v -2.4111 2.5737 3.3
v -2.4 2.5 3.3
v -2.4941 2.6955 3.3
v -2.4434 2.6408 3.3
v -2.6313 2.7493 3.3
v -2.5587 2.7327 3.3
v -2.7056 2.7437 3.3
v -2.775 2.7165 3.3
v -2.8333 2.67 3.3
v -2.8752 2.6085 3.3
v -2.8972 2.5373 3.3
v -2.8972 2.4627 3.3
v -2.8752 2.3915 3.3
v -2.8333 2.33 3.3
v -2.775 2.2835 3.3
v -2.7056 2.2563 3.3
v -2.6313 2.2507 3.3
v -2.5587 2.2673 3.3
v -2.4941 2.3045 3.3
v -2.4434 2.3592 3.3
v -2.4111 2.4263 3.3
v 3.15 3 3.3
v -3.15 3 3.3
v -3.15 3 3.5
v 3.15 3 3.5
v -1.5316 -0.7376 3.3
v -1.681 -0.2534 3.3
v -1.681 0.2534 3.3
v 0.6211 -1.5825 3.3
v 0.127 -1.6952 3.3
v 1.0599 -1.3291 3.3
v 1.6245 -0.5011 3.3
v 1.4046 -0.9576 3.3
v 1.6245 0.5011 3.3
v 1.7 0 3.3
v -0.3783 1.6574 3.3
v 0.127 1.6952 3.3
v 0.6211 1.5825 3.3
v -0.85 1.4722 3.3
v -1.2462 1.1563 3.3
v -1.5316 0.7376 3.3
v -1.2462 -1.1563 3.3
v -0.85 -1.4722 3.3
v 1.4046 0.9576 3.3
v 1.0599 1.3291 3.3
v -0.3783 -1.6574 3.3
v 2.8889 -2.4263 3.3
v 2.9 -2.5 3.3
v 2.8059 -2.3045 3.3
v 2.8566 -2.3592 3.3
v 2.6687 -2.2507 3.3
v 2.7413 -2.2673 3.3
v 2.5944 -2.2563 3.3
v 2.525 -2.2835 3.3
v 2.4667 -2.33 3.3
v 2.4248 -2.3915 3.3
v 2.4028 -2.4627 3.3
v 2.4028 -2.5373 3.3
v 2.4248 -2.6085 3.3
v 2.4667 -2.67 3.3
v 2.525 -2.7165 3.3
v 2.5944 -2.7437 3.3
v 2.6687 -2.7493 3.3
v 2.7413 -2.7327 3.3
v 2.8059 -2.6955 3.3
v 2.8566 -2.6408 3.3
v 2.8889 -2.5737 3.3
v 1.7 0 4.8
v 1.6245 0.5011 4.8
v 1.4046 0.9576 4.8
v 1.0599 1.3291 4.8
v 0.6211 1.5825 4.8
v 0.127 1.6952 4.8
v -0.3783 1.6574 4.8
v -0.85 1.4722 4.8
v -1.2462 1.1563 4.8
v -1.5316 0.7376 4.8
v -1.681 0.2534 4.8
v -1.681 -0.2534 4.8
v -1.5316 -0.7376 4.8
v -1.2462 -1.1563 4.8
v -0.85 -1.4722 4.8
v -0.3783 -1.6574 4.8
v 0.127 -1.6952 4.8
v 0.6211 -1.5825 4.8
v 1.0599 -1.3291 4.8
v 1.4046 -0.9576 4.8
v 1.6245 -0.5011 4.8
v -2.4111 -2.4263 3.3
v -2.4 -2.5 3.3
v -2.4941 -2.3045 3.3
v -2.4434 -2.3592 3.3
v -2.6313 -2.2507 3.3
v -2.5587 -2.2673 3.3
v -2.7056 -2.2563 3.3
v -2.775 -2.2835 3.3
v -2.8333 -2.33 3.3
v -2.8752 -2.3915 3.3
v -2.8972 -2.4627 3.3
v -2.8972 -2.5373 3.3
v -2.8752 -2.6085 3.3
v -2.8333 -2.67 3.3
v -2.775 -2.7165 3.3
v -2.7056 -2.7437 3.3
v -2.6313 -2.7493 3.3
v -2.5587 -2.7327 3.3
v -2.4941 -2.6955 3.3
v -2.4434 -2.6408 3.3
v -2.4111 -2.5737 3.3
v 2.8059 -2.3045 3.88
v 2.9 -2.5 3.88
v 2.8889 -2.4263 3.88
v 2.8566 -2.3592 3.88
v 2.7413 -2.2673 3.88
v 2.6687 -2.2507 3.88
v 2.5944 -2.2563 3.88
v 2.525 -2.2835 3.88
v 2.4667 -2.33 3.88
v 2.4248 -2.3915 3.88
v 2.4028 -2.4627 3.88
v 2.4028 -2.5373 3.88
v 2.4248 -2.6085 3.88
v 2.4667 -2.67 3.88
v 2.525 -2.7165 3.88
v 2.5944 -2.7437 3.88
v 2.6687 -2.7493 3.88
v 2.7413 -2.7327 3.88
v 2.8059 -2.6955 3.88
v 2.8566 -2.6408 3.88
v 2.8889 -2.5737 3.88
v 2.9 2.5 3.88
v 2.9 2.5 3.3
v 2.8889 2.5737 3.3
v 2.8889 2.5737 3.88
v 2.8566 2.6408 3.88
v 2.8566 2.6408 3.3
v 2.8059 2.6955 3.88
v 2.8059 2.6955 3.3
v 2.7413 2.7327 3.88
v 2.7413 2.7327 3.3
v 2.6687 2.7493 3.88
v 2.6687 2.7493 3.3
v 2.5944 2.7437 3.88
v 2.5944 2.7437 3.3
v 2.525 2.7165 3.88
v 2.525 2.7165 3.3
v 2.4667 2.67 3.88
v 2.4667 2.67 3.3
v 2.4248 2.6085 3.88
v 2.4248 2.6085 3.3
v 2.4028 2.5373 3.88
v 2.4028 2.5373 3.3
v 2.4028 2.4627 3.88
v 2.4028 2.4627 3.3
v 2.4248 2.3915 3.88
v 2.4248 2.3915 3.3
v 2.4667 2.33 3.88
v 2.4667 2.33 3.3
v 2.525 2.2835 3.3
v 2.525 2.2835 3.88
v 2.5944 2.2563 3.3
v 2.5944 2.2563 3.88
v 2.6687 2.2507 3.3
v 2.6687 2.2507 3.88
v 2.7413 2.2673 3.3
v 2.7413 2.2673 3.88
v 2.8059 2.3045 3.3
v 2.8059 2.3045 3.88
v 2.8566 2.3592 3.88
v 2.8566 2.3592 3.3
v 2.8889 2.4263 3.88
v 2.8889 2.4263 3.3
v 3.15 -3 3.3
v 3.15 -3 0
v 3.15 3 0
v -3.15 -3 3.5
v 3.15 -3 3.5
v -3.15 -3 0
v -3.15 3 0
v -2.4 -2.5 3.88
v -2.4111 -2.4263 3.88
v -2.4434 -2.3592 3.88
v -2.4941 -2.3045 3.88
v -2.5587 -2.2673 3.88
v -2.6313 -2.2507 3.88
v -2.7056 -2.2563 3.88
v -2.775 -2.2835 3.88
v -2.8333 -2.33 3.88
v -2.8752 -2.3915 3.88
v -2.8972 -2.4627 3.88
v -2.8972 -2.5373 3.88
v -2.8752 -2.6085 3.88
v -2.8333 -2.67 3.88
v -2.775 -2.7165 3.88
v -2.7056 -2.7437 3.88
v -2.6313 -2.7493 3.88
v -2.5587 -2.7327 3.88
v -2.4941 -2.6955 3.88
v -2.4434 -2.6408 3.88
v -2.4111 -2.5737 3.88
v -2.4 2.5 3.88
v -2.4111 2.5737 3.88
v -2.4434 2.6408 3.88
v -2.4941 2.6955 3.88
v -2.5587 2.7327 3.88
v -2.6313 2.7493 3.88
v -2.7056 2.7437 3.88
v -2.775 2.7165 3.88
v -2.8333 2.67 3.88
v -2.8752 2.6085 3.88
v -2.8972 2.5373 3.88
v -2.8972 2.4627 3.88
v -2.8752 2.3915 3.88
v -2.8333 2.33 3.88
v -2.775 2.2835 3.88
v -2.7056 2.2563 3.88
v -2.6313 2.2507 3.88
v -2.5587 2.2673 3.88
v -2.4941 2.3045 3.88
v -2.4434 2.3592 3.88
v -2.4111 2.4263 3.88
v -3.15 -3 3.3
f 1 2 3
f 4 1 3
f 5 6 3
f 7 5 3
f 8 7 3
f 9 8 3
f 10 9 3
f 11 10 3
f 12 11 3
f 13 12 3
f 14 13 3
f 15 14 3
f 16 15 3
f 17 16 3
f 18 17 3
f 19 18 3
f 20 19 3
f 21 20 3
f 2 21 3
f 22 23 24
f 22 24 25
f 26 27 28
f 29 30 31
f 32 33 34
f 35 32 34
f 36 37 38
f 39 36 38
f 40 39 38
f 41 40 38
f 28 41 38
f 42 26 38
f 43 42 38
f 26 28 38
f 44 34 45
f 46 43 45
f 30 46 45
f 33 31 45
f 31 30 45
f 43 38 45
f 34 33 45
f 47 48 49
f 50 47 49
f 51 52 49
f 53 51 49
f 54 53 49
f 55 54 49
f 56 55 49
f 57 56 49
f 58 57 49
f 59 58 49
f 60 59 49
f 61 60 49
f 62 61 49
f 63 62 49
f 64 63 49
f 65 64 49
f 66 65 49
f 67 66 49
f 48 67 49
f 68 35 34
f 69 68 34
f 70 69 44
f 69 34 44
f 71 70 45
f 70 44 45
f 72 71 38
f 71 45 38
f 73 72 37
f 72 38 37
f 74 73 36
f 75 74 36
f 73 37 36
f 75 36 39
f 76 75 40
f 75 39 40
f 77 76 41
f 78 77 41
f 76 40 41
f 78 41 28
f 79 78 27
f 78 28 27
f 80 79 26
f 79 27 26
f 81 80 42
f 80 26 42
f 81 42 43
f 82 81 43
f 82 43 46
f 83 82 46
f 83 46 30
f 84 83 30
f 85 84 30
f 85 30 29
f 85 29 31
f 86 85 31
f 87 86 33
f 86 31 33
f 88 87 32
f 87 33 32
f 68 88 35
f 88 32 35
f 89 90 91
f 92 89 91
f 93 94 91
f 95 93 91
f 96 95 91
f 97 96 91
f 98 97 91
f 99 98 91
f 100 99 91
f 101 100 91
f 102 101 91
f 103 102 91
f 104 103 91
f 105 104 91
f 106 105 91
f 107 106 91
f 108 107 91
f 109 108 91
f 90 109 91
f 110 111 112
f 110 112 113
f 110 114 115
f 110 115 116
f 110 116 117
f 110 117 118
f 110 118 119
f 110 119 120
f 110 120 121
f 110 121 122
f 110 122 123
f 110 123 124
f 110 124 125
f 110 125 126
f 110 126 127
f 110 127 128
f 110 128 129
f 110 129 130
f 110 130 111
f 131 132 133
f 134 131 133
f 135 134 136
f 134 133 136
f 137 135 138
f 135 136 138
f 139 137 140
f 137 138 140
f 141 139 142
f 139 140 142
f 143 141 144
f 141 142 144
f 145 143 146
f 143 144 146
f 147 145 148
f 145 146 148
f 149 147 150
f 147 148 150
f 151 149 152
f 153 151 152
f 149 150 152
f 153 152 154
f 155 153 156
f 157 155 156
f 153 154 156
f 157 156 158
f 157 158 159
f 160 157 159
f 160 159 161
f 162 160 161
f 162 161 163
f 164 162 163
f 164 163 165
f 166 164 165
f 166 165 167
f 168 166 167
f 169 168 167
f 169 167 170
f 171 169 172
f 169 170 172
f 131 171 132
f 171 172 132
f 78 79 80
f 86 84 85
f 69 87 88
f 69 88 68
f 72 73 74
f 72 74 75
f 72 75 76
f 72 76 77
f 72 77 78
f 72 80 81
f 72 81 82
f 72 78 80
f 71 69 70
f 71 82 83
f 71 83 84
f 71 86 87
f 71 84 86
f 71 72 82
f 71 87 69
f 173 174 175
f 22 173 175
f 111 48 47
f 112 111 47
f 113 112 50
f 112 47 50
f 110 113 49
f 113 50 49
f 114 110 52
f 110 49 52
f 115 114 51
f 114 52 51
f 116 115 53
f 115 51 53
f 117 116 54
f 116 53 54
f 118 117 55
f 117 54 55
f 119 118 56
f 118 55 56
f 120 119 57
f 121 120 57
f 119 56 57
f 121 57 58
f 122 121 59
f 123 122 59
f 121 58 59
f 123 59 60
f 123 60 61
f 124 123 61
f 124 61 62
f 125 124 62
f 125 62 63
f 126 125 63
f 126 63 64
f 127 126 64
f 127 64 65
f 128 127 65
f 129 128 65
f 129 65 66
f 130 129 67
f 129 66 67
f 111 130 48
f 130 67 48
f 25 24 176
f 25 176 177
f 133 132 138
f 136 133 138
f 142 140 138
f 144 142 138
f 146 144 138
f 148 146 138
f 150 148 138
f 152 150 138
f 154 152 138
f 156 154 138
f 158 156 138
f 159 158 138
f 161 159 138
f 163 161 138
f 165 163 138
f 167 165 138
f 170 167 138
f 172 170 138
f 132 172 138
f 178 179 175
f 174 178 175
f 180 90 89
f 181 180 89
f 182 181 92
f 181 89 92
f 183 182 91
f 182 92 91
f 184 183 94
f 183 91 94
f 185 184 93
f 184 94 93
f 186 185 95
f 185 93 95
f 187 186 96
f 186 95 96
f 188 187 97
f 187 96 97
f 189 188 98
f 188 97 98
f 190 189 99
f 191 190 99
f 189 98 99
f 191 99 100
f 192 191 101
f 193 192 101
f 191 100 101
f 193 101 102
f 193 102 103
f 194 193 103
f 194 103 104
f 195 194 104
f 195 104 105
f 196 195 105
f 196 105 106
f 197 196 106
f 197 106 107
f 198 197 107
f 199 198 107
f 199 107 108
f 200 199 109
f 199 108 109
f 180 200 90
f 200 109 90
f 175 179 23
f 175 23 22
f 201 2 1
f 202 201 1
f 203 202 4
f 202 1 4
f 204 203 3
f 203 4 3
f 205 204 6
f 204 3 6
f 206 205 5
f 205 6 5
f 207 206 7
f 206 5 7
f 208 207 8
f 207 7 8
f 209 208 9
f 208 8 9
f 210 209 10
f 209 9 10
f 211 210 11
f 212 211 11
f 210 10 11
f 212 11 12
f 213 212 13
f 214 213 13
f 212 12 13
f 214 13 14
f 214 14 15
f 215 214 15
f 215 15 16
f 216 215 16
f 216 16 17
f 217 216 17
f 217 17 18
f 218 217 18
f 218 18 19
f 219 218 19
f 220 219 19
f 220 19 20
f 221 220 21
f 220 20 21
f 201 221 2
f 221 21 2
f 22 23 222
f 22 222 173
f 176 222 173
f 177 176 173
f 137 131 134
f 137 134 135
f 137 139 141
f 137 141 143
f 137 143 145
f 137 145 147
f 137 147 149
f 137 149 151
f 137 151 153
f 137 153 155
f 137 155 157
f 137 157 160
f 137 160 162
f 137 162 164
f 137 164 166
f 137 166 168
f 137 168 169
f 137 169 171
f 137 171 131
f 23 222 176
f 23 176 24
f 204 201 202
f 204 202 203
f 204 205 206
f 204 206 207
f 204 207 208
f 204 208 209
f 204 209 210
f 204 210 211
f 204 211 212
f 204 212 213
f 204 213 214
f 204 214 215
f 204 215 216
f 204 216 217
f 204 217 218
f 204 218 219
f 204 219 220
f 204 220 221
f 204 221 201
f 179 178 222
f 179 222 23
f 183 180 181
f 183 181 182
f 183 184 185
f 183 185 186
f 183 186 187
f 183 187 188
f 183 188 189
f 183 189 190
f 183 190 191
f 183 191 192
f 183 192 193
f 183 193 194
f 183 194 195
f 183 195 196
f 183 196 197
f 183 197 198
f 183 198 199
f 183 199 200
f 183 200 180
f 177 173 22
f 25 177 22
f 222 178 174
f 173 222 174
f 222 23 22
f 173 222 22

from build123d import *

# Parameters (mm, degrees)
F0_W     = 6.3
F0_H     = 6
F1_DEPTH = 3.3
F2_W     = 6.3
F2_H     = 6
F3_DEPTH = 0.2
F4_R     = 1.7
F5_DEPTH = 1.5
F4_R_2   = 0.25
F6_DEPTH = 0.58


with BuildPart() as f1:
    # F0 (on Top) → F1 (new body)
    with BuildSketch(Plane.XY):
        Rectangle(F0_W, F0_H)
    extrude(amount=F1_DEPTH)


with BuildPart() as f3:
    # F2 (on face) → F3 (new body)
    with BuildSketch(Plane.XY.offset(3.3)):
        Rectangle(F2_W, F2_H)
    extrude(amount=F3_DEPTH)


with BuildPart() as f5:
    # F4 (on face) → F5 (new body)
    with BuildSketch(Plane.XY.offset(3.3)):
        Circle(F4_R)
    extrude(amount=F5_DEPTH)


with BuildPart() as f6:
    # F4 (on face) → F6 (new body)
    with BuildSketch(Plane.XY.offset(3.3)):
        with Locations((-2.65, 2.5)):
            Circle(F4_R_2)
        with Locations((2.65, 2.5)):
            Circle(F4_R_2)
        with Locations((2.65, -2.5)):
            Circle(F4_R_2)
        with Locations((-2.65, -2.5)):
            Circle(F4_R_2)
    extrude(amount=F6_DEPTH)


solid = Compound([f1.part, f3.part, f5.part, f6.part])
